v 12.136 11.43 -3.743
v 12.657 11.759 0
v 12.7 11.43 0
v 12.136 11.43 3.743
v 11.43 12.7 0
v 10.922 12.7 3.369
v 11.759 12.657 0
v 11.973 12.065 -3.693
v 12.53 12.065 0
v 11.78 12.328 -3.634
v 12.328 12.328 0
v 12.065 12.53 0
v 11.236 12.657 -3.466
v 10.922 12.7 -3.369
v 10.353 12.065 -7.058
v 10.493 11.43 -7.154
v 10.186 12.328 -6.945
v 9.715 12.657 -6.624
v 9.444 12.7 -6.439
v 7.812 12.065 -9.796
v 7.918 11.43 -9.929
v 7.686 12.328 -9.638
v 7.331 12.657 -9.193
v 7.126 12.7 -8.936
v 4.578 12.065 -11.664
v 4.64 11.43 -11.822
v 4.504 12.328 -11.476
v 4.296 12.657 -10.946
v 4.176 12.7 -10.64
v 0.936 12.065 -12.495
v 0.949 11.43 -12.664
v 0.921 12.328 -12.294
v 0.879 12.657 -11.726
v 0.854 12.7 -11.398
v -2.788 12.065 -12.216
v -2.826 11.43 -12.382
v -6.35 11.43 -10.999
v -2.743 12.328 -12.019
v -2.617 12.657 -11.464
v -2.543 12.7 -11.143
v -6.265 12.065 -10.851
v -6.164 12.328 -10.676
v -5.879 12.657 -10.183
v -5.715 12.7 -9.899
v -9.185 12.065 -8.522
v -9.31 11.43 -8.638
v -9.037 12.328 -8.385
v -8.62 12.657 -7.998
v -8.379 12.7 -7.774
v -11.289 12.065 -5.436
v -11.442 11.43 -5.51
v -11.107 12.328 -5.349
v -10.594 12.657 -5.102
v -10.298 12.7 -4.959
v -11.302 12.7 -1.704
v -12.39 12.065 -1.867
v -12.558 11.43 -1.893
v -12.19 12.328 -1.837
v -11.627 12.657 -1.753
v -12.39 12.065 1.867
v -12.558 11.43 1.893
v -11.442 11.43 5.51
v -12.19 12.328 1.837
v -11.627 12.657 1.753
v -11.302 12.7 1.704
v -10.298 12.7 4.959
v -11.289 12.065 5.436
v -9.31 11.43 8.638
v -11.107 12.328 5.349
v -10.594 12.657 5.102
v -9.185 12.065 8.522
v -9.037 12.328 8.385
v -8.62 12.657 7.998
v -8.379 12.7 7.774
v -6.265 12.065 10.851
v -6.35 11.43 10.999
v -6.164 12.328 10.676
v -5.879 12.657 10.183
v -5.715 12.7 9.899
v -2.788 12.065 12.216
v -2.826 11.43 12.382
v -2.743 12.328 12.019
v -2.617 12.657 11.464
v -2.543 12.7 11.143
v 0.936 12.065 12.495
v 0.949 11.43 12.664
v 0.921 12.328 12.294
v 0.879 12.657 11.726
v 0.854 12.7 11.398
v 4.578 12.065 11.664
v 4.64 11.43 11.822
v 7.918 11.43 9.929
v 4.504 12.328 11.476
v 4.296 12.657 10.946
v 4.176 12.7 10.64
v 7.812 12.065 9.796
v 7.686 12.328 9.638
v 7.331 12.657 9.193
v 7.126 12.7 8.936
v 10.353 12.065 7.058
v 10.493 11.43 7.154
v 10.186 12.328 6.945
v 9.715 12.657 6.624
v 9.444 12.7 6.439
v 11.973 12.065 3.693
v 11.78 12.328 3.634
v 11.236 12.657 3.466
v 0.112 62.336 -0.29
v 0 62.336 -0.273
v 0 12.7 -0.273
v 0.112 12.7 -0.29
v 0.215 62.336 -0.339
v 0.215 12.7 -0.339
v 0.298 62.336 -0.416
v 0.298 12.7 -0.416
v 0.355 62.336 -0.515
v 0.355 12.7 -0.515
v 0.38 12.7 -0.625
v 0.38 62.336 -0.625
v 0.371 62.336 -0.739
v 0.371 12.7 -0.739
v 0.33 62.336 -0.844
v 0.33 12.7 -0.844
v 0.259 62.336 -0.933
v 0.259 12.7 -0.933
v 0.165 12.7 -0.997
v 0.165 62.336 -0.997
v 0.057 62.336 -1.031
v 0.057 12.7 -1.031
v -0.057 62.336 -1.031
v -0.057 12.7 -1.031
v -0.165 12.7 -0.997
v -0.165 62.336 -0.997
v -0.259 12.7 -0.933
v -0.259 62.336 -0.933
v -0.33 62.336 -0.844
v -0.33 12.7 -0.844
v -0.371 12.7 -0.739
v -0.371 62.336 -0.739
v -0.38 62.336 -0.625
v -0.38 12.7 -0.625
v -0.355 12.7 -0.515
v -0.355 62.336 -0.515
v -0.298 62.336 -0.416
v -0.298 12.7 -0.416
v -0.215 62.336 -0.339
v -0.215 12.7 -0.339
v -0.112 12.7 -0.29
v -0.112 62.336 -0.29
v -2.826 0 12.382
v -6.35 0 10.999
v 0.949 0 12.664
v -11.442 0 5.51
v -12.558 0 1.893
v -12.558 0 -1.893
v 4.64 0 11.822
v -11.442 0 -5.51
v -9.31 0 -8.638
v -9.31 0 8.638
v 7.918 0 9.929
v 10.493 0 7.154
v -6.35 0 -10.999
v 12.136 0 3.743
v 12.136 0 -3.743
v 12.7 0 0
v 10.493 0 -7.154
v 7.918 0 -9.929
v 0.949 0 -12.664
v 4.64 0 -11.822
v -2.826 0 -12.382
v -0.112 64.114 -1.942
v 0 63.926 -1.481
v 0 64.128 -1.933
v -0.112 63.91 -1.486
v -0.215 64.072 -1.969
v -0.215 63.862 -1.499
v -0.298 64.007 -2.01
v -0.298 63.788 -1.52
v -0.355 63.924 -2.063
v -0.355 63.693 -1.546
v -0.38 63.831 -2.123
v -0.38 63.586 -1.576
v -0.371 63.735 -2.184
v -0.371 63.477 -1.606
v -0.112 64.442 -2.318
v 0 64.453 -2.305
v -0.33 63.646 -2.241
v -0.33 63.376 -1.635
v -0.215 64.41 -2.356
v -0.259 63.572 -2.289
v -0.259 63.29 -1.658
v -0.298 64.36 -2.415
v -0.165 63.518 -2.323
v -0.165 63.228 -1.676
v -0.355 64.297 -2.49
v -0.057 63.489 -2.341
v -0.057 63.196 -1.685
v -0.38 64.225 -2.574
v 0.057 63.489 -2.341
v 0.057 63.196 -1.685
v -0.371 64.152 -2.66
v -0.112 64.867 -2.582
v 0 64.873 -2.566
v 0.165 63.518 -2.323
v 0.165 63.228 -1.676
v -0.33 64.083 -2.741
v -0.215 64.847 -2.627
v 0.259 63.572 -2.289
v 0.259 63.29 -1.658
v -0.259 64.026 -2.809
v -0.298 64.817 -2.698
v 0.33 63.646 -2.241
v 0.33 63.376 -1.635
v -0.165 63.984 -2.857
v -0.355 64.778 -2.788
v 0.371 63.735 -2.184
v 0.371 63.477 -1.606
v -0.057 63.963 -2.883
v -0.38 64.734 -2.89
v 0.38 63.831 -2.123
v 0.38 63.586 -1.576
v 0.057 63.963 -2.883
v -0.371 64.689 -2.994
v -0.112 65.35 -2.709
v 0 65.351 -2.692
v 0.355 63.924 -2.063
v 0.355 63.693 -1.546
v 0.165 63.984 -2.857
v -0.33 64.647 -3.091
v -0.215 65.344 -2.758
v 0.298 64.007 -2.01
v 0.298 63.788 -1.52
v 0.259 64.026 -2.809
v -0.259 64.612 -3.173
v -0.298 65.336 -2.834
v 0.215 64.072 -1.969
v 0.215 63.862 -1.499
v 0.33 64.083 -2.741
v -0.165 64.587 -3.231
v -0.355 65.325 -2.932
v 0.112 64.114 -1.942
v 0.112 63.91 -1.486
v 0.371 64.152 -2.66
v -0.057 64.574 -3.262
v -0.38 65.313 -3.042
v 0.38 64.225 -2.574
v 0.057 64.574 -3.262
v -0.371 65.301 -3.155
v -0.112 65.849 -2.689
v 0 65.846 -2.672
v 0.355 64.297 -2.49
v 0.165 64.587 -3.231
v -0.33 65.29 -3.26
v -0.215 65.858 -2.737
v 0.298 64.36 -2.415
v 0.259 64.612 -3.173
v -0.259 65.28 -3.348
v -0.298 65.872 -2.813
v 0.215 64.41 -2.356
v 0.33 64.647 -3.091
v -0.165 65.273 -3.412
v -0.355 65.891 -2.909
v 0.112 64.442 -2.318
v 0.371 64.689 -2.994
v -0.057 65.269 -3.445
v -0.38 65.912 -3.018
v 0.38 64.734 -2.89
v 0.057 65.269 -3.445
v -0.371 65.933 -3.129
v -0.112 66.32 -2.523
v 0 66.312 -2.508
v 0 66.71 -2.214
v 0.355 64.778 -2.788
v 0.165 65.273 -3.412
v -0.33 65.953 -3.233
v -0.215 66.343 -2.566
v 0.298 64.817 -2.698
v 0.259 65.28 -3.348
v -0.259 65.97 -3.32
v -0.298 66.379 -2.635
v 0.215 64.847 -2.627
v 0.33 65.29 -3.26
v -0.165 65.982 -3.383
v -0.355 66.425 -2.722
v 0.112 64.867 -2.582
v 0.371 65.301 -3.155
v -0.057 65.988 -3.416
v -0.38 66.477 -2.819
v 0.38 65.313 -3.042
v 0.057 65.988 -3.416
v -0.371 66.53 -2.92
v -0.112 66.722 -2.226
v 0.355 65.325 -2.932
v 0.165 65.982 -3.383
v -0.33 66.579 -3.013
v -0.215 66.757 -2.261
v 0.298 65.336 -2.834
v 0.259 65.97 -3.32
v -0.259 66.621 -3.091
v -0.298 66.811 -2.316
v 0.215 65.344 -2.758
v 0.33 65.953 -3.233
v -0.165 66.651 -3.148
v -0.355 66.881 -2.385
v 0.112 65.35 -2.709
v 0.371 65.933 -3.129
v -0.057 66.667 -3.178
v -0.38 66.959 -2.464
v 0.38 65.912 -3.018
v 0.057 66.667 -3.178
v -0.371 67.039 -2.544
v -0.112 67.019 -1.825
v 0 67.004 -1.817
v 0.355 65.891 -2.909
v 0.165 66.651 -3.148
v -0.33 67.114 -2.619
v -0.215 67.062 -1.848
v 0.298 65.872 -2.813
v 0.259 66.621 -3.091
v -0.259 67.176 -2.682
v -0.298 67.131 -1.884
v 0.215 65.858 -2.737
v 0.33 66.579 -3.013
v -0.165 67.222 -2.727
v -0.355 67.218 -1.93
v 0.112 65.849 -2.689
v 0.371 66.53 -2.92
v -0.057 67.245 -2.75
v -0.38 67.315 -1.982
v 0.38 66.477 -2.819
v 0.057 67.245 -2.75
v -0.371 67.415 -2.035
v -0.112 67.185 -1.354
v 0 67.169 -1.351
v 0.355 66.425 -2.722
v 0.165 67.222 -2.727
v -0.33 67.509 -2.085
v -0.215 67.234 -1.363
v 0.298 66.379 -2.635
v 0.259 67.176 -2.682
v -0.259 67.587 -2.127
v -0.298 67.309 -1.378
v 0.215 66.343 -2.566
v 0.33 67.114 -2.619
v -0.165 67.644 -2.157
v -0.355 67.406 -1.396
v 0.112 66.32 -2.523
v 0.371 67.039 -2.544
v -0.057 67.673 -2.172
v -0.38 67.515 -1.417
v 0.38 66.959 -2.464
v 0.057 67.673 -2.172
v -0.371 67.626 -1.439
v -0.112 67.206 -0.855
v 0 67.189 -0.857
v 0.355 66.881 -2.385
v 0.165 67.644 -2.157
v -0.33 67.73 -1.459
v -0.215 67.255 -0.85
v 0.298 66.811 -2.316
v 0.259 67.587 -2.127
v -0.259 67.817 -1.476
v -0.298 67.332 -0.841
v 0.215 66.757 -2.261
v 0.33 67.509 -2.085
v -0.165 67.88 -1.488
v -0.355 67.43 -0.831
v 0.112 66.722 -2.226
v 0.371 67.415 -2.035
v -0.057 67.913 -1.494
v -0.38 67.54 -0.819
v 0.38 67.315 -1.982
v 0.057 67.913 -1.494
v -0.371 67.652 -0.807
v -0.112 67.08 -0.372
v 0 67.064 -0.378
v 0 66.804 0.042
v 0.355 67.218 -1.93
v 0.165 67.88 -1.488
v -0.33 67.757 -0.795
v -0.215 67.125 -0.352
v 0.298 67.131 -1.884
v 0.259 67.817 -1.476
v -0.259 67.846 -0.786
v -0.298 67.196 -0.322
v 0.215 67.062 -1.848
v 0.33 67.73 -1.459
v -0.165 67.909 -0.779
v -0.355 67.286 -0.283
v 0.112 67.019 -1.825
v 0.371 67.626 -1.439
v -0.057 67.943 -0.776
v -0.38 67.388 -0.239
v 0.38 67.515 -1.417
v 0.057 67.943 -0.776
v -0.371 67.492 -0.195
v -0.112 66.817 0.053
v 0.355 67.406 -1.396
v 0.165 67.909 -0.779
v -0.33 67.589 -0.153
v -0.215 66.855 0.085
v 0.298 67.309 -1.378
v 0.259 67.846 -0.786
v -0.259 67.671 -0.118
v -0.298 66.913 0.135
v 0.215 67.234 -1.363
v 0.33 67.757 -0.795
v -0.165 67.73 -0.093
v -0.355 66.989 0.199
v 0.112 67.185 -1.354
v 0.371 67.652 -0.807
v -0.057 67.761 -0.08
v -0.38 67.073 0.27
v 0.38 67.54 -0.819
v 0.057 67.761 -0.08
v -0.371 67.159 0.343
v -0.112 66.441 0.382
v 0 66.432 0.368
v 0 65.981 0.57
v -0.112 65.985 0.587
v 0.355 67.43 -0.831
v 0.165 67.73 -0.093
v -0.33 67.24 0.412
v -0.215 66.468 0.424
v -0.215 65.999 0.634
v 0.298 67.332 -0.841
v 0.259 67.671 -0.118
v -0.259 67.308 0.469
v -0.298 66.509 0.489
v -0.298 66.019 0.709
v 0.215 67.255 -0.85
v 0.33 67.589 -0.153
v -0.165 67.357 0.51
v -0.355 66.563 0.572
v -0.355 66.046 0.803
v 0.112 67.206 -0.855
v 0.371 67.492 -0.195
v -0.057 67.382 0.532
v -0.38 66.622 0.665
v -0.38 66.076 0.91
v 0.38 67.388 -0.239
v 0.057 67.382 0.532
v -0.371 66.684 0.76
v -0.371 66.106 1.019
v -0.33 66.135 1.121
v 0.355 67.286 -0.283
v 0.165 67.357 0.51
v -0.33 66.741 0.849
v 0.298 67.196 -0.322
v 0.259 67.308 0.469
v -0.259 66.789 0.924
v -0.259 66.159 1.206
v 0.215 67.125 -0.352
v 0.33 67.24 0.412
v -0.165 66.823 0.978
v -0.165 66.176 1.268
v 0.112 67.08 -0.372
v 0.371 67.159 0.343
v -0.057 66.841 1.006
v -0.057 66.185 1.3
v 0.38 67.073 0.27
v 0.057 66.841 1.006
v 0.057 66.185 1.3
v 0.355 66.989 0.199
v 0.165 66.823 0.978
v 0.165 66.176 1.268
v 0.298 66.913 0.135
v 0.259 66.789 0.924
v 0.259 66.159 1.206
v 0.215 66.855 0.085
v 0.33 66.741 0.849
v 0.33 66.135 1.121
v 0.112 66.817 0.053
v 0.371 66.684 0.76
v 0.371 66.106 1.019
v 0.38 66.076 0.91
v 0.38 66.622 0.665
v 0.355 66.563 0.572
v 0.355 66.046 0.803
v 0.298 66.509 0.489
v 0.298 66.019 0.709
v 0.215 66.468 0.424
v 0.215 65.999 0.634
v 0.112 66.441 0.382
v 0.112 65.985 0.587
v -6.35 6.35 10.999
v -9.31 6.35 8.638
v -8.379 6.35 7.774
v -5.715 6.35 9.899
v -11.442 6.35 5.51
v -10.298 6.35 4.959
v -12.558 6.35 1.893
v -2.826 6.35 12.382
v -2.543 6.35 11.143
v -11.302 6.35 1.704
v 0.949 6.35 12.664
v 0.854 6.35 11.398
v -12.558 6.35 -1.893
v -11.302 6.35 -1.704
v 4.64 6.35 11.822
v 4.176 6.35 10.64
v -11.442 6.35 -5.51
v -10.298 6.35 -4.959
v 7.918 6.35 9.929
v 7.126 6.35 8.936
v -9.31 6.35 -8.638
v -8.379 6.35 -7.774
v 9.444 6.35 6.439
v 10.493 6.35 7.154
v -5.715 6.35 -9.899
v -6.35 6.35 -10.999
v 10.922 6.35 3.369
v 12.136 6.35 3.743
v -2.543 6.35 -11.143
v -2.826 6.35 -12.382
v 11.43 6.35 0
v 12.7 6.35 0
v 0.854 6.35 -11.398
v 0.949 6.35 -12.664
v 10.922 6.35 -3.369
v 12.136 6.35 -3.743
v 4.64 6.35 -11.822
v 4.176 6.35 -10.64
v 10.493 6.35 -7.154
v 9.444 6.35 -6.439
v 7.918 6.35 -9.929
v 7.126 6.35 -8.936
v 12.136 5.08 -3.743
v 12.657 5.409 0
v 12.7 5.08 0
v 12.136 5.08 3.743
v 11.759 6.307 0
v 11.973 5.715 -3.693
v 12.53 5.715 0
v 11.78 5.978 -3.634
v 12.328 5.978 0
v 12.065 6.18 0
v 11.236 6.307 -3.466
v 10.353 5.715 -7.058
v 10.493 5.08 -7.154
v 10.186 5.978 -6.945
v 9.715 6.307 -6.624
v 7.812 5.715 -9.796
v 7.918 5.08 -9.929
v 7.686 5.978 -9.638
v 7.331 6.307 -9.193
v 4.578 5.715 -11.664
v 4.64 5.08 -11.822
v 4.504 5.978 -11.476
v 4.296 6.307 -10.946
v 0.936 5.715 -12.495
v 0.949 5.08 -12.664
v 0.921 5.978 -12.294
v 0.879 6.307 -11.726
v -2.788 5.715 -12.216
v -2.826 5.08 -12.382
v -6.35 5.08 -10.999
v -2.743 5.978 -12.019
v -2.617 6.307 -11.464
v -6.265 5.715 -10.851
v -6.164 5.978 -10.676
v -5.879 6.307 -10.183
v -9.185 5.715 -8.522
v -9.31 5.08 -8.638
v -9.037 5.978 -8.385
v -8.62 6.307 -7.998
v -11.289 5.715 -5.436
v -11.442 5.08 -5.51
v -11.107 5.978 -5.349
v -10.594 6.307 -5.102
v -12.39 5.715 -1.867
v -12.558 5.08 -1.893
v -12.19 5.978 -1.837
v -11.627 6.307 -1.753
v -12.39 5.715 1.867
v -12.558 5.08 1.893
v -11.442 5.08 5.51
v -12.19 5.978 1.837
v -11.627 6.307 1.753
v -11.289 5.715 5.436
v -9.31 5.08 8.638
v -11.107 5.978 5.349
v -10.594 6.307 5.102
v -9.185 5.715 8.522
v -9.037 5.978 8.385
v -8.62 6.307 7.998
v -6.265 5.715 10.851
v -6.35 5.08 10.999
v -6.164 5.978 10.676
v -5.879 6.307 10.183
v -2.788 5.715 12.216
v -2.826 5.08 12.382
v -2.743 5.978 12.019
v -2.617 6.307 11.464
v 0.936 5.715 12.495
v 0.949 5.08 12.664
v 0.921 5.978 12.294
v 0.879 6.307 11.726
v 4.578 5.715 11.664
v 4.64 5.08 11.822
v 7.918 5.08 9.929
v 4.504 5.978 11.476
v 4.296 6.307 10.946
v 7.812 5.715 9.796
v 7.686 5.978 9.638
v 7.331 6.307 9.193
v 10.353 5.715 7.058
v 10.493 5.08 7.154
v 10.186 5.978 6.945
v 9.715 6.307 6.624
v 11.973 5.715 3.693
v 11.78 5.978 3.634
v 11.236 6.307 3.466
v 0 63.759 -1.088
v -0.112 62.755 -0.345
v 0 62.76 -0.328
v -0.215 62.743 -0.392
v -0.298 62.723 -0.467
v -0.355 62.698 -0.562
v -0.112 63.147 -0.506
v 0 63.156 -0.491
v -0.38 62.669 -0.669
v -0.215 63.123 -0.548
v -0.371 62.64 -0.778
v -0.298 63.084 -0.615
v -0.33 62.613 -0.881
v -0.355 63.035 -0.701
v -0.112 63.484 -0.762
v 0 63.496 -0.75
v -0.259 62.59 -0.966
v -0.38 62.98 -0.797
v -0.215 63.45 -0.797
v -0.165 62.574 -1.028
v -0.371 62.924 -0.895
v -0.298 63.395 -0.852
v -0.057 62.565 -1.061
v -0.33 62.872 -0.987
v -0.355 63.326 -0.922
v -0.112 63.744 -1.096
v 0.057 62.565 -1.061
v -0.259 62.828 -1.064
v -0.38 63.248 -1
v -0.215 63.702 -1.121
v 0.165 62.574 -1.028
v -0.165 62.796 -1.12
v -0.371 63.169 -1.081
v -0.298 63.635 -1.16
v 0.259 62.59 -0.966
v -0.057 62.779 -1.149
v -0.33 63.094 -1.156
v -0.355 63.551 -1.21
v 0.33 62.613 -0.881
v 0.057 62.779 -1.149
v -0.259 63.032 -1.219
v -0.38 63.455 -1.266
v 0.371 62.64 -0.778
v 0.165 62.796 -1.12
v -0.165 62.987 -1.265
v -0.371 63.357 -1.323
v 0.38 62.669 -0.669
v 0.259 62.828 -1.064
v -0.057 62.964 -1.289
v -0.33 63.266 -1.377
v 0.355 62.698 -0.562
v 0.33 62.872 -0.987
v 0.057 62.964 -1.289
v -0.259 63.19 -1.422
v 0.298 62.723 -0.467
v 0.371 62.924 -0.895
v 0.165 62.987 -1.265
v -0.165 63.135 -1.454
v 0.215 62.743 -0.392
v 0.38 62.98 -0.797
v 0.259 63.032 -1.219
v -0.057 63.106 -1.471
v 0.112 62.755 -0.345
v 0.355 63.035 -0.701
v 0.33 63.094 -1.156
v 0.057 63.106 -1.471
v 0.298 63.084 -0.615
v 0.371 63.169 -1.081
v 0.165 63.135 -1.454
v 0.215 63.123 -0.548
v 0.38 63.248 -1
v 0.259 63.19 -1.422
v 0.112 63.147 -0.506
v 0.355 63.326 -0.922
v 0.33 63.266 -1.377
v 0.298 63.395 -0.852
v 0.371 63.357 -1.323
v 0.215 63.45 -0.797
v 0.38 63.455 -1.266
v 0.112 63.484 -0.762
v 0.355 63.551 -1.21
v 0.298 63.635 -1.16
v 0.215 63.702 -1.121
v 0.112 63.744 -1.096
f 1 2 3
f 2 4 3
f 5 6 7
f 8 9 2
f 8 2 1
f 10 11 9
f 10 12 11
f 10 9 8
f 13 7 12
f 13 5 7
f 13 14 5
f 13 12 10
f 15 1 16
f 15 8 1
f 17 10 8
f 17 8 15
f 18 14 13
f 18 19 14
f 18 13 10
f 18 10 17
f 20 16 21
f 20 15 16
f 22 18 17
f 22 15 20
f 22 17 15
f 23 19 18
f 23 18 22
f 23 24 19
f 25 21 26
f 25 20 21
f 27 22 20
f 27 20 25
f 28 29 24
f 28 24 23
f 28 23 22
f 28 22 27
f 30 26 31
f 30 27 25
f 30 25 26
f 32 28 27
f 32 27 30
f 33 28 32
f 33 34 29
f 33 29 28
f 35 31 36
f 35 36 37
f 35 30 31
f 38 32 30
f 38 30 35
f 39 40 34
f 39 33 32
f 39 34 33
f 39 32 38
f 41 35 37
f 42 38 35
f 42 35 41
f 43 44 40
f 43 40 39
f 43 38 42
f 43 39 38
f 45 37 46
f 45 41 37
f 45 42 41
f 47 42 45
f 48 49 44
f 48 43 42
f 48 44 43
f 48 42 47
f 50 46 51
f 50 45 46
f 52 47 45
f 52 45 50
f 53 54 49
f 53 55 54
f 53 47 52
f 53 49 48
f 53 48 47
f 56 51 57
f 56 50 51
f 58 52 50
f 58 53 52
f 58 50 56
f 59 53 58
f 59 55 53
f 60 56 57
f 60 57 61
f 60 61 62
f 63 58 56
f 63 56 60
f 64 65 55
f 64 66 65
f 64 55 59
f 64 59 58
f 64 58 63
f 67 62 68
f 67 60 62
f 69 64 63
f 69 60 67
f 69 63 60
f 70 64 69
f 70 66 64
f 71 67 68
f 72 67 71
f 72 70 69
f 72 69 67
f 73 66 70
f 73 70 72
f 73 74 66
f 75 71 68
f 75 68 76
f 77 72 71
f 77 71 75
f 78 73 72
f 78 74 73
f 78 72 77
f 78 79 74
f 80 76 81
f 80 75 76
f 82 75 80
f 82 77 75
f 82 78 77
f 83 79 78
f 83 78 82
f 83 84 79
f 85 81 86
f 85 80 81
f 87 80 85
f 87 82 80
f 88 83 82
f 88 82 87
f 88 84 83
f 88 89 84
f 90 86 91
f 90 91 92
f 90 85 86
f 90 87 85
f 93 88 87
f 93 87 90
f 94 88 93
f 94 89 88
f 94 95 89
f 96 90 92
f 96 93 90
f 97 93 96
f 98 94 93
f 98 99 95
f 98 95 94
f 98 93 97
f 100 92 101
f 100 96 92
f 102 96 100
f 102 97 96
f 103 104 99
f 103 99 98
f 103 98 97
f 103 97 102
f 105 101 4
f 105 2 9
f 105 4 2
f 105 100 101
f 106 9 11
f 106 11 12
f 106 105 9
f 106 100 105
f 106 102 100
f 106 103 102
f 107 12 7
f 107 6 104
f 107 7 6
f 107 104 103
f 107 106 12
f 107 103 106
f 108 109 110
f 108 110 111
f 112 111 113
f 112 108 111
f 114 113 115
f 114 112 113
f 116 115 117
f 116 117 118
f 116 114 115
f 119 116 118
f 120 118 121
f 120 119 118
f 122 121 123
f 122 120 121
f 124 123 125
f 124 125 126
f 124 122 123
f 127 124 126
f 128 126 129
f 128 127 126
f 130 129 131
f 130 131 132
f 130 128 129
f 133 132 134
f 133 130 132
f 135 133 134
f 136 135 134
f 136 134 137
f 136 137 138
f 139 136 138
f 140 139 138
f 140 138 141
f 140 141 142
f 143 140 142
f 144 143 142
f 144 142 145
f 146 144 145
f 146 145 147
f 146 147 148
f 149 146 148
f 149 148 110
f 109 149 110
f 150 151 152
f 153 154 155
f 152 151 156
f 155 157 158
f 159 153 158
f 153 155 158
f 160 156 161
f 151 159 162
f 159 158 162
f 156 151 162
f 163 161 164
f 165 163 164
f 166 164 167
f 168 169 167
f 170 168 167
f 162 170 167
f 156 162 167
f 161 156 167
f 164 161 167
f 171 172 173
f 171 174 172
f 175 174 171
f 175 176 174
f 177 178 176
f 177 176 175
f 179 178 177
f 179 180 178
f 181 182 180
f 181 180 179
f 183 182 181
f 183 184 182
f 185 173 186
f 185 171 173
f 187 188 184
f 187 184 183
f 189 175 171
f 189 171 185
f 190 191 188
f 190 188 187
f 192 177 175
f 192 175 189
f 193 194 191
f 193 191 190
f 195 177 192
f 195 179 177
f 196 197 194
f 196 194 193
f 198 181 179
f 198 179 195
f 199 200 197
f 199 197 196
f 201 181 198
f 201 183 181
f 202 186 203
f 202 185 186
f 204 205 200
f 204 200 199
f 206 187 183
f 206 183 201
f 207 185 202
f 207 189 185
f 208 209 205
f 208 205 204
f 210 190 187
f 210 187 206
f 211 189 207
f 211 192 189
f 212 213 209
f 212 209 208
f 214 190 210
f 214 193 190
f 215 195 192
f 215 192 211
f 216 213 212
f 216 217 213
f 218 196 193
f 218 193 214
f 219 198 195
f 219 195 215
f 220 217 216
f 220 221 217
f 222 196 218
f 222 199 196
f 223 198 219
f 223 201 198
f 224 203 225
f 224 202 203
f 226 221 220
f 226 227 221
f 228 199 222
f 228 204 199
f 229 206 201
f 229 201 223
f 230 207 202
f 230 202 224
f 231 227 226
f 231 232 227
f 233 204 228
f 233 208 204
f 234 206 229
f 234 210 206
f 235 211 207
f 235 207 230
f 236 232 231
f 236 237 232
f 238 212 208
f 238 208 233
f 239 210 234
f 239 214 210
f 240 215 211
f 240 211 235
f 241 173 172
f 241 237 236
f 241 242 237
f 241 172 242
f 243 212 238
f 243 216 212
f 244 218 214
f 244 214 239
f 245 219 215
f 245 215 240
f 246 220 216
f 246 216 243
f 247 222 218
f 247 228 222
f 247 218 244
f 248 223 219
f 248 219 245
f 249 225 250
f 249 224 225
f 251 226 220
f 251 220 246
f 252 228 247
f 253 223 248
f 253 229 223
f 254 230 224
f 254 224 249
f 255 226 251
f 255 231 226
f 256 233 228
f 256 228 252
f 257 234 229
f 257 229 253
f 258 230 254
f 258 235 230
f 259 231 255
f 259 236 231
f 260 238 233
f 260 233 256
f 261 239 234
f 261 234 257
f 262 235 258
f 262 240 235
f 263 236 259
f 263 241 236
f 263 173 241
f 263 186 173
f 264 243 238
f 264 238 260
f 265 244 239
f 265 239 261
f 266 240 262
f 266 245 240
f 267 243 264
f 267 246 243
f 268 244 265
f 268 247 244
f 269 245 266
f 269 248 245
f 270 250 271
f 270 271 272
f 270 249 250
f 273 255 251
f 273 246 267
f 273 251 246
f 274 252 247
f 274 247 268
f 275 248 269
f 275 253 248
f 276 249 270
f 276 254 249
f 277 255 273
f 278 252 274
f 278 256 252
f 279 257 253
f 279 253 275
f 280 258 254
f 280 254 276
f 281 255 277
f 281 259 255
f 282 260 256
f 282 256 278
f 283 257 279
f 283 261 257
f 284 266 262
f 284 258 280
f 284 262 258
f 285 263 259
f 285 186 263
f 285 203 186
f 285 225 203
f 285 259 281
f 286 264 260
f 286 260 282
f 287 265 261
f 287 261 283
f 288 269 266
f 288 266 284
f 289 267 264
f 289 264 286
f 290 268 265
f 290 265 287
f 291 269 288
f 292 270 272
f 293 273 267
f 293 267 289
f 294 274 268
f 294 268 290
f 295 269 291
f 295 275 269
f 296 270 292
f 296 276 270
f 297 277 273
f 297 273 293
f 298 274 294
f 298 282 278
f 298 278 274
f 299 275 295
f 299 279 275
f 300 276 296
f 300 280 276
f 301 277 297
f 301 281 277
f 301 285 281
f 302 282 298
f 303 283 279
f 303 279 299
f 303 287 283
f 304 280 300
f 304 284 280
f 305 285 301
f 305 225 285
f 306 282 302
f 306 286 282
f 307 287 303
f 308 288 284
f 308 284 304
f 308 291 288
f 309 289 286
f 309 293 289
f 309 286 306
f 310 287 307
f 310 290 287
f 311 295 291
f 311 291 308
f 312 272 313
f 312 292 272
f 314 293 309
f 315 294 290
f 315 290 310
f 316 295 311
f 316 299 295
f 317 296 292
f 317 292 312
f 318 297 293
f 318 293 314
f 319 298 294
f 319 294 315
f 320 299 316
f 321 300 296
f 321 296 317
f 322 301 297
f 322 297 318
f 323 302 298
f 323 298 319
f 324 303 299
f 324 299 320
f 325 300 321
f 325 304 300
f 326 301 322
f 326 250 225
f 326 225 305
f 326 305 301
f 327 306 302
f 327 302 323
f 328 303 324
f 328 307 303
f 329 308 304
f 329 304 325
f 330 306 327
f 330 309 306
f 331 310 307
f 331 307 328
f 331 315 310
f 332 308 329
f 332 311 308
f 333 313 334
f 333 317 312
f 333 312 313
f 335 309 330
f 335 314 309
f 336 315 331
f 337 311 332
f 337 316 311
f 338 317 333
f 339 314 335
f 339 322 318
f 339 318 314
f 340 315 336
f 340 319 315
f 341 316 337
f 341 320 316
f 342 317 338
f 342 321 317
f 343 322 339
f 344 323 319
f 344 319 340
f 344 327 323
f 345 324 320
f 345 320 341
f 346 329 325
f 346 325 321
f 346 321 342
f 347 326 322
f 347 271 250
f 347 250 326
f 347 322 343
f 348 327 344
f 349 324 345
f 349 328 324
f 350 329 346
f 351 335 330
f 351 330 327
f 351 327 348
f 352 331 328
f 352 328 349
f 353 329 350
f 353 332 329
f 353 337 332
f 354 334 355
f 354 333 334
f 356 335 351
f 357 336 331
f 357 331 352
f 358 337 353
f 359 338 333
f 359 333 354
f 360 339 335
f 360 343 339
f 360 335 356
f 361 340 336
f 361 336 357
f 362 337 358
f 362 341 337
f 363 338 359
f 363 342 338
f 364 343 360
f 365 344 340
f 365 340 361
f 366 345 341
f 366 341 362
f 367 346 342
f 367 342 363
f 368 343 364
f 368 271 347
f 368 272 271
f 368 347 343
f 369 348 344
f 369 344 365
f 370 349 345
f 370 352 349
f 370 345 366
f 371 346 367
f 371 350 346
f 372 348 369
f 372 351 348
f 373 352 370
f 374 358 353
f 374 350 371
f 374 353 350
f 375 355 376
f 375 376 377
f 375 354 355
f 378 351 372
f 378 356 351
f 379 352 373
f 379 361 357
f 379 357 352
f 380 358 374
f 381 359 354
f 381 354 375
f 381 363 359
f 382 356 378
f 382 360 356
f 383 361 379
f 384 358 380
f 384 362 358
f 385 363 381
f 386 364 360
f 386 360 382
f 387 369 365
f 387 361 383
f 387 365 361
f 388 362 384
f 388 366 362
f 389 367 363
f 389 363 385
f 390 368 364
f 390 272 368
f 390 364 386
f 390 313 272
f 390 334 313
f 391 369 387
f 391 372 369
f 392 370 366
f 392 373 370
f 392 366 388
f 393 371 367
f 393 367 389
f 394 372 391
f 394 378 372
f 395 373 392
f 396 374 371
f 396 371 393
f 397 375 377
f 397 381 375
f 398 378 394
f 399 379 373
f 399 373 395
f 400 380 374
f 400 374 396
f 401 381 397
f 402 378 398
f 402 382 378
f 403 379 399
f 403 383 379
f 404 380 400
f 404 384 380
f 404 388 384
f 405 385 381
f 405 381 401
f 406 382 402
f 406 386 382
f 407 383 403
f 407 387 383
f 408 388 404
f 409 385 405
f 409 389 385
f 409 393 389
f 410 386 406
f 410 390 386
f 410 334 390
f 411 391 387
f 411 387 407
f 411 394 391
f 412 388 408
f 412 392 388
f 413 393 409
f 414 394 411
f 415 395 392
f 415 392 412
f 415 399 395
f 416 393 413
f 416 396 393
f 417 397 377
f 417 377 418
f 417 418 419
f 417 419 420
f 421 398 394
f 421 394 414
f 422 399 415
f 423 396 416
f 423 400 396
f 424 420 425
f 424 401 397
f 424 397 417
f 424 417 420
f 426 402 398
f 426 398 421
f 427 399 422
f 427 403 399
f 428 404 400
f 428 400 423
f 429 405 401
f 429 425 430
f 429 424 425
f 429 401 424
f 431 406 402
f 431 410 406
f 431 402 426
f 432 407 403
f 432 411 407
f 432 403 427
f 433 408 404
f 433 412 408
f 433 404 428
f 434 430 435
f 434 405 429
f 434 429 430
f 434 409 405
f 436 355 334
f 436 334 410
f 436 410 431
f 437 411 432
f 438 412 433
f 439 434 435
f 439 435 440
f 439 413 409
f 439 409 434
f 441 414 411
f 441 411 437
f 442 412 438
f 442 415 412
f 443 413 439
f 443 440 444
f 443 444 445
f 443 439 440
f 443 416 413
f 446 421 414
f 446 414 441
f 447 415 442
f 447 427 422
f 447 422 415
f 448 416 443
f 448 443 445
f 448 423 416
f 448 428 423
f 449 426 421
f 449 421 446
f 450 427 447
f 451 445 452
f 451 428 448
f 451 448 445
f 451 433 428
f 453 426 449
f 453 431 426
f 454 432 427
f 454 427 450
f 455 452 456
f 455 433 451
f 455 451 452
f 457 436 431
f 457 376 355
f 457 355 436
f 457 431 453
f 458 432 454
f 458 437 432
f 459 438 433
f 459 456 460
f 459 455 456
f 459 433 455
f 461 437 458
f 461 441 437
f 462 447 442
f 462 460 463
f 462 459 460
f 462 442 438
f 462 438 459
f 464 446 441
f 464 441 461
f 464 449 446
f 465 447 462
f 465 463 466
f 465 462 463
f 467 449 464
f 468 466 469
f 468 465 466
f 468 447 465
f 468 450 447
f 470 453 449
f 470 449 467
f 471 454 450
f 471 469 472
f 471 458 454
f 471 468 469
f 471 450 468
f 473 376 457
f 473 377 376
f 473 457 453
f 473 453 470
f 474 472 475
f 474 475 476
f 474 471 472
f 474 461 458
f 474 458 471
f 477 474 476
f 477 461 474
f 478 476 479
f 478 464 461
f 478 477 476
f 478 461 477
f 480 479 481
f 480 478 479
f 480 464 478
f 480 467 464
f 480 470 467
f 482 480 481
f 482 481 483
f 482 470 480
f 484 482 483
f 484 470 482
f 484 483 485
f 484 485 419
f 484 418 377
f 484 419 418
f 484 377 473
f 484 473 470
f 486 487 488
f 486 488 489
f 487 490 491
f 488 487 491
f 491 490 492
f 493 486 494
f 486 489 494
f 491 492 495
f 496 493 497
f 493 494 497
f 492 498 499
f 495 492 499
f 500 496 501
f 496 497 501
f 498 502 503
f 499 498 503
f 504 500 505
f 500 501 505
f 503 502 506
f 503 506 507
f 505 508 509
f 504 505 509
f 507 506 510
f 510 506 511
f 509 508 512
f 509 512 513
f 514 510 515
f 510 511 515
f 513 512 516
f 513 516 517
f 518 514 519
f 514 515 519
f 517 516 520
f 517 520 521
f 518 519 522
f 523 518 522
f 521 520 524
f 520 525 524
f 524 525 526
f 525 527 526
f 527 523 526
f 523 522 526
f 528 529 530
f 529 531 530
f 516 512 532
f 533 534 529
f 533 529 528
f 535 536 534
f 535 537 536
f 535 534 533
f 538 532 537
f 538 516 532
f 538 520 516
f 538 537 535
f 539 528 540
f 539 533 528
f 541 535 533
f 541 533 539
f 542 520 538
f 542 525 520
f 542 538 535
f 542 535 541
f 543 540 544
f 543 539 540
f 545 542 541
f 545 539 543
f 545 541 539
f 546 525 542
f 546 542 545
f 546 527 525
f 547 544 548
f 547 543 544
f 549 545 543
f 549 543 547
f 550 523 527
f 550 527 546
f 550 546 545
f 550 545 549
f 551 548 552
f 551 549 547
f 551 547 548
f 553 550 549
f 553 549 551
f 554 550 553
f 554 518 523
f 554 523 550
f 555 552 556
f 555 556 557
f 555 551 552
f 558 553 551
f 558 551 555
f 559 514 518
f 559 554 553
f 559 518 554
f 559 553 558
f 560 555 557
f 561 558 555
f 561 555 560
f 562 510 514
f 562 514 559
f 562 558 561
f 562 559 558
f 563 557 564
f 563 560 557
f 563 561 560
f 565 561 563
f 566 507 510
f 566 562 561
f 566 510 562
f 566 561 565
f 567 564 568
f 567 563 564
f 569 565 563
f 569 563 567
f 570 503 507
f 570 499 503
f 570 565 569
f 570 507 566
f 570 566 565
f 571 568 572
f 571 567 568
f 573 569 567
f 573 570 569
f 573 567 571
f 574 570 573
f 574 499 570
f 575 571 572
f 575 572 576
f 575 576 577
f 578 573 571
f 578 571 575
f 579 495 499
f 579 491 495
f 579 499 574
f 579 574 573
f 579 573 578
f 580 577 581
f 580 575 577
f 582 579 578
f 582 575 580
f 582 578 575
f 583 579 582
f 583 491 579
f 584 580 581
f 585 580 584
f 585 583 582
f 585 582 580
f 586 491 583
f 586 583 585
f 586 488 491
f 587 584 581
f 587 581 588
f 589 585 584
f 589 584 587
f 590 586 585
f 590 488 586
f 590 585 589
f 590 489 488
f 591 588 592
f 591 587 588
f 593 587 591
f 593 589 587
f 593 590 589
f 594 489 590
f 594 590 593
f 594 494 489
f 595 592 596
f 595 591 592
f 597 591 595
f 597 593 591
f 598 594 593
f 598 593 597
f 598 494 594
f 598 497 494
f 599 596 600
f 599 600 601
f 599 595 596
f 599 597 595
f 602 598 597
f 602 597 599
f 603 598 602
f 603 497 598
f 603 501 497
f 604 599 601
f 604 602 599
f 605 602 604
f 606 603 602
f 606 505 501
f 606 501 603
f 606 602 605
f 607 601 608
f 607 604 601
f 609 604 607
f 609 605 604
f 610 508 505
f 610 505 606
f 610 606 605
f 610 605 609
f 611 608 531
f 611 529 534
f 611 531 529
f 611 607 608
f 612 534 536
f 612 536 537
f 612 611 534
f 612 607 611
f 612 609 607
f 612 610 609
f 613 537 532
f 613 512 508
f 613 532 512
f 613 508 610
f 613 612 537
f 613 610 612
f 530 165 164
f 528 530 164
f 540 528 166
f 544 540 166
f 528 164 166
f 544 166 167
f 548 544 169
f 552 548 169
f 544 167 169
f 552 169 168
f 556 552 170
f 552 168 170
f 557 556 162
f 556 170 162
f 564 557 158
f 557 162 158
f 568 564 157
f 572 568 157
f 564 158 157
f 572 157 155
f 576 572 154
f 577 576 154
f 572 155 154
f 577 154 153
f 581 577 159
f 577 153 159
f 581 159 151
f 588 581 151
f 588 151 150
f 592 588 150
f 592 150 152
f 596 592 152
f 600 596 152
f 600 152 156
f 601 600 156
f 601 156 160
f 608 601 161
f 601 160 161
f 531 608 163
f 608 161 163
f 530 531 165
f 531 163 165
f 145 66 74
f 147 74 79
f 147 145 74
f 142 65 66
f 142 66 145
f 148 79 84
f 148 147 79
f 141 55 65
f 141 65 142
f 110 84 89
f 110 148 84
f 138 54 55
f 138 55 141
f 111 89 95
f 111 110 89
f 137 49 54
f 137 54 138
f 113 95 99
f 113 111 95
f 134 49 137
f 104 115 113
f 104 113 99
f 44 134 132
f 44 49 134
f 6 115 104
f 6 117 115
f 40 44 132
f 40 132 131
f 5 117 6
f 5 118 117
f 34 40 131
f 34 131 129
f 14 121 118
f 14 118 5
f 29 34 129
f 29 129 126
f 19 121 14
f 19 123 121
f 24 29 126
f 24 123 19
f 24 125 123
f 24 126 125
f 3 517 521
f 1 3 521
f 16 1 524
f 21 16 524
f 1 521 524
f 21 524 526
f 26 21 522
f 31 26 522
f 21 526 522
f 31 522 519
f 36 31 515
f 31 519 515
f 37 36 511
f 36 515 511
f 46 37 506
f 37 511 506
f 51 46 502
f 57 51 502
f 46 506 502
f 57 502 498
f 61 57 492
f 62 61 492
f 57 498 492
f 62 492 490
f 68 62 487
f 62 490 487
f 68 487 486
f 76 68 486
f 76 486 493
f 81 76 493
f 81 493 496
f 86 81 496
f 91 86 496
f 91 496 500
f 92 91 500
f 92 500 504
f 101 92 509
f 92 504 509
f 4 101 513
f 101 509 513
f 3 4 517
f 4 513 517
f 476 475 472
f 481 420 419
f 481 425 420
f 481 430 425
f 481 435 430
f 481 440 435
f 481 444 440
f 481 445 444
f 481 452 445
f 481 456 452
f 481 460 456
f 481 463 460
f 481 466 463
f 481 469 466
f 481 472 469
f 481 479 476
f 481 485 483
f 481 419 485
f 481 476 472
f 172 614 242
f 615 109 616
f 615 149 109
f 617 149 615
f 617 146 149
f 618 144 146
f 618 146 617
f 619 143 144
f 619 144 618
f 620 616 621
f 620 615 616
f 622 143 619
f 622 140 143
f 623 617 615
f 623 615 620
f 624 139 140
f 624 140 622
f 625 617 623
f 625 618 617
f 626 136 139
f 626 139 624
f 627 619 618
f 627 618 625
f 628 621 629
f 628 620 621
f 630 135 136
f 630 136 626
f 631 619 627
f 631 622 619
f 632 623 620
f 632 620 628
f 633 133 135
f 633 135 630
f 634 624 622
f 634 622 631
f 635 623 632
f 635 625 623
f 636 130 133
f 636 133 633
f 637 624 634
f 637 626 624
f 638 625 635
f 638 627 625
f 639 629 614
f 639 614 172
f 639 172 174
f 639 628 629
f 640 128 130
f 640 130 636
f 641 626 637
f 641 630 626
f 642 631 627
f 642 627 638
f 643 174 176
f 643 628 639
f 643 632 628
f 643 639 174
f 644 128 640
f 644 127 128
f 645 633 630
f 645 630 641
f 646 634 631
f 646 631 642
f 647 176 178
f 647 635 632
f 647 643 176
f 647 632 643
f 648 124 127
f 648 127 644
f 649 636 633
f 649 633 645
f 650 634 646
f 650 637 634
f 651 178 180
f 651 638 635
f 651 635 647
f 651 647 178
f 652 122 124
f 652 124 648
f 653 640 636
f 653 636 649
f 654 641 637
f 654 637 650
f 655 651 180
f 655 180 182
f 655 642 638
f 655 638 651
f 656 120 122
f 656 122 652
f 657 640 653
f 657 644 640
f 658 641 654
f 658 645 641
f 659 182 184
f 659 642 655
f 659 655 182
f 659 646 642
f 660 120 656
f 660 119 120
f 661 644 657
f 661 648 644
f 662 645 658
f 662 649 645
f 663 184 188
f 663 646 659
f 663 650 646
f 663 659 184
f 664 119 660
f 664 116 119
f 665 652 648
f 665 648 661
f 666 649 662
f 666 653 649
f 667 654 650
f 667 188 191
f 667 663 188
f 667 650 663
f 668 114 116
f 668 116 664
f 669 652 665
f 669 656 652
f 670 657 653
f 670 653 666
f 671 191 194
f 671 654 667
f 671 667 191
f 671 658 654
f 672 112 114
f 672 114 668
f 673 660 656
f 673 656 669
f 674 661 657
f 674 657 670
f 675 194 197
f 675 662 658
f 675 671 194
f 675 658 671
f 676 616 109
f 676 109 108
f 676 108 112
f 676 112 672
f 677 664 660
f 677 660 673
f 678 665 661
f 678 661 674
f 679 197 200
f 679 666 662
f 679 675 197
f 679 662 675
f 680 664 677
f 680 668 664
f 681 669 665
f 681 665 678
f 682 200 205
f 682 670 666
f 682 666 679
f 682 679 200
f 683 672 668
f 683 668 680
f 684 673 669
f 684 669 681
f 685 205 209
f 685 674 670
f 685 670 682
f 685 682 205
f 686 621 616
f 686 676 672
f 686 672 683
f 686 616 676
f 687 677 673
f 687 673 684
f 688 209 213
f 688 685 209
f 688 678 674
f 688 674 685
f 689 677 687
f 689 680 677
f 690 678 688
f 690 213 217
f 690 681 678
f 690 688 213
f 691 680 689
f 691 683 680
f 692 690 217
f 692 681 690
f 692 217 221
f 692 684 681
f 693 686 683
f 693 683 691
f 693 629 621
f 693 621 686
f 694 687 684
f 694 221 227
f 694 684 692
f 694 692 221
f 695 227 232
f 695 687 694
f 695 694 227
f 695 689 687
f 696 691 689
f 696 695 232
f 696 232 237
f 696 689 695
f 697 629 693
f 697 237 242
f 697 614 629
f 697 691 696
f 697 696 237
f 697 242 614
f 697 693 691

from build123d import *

# Parameters (mm, degrees)
SKETCH1_R           = 12.7
BOSS_EXTRUDE1_DEPTH = 6.35
FILLET1_R           = 1.27
SKETCH2_R           = 12.7
BOSS_EXTRUDE2_DEPTH = 6.35
FILLET2_R           = 1.27
SWEEP1_PROFILE_R    = 0.381


with BuildPart() as part:
    # Sketch1 → Boss-Extrude1 (new body)
    with BuildSketch(Plane(origin=(0, 0, 0), x_dir=(1, 0, 0), z_dir=(0, 1, 0))):
        Circle(SKETCH1_R)
    extrude(amount=BOSS_EXTRUDE1_DEPTH)

    # Fillet1
    fillet1_edges = [part.edges().sort_by_distance(p)[0] for p in [
        (-12.7, 6.35, 0),
    ]]
    fillet(fillet1_edges, radius=FILLET1_R)

    # Sketch2 → Boss-Extrude2 (add)
    with BuildSketch(Plane(origin=(0, 6.35, 0), x_dir=(1, 0, 0), z_dir=(0, 1, 0))):
        Circle(SKETCH2_R)
    extrude(amount=BOSS_EXTRUDE2_DEPTH)

    # Fillet2
    fillet2_edges = [part.edges().sort_by_distance(p)[0] for p in [
        (-12.7, 12.7, 0),
    ]]
    fillet(fillet2_edges, radius=FILLET2_R)

    # Sweep1: sweep along a path in Sketch4
    with BuildLine(Plane(origin=(0, 0, 0), x_dir=(0, 0, -1), z_dir=(1, 0, 0))) as sweep1_path:
        Line((0.653856162, 12.7), (0.653856162, 62.335507358))
        ThreePointArc((0.653856162, 62.335507358), (0.91265079, 63.103858642), (1.58356277, 63.559067903))
        ThreePointArc((1.58356277, 63.559067903), (2.483877112, 66.979023941), (-0.937317322, 66.083427011))
    # Sweep1 profile (on start of the path) → Sweep1 (sweep)
    with BuildSketch(Plane(origin=(0, 12.7, -0.653856162), x_dir=(0, 0, 1), z_dir=(0, 1, 0))):
        Circle(SWEEP1_PROFILE_R)
    sweep(path=sweep1_path.line)


solid = part.part
